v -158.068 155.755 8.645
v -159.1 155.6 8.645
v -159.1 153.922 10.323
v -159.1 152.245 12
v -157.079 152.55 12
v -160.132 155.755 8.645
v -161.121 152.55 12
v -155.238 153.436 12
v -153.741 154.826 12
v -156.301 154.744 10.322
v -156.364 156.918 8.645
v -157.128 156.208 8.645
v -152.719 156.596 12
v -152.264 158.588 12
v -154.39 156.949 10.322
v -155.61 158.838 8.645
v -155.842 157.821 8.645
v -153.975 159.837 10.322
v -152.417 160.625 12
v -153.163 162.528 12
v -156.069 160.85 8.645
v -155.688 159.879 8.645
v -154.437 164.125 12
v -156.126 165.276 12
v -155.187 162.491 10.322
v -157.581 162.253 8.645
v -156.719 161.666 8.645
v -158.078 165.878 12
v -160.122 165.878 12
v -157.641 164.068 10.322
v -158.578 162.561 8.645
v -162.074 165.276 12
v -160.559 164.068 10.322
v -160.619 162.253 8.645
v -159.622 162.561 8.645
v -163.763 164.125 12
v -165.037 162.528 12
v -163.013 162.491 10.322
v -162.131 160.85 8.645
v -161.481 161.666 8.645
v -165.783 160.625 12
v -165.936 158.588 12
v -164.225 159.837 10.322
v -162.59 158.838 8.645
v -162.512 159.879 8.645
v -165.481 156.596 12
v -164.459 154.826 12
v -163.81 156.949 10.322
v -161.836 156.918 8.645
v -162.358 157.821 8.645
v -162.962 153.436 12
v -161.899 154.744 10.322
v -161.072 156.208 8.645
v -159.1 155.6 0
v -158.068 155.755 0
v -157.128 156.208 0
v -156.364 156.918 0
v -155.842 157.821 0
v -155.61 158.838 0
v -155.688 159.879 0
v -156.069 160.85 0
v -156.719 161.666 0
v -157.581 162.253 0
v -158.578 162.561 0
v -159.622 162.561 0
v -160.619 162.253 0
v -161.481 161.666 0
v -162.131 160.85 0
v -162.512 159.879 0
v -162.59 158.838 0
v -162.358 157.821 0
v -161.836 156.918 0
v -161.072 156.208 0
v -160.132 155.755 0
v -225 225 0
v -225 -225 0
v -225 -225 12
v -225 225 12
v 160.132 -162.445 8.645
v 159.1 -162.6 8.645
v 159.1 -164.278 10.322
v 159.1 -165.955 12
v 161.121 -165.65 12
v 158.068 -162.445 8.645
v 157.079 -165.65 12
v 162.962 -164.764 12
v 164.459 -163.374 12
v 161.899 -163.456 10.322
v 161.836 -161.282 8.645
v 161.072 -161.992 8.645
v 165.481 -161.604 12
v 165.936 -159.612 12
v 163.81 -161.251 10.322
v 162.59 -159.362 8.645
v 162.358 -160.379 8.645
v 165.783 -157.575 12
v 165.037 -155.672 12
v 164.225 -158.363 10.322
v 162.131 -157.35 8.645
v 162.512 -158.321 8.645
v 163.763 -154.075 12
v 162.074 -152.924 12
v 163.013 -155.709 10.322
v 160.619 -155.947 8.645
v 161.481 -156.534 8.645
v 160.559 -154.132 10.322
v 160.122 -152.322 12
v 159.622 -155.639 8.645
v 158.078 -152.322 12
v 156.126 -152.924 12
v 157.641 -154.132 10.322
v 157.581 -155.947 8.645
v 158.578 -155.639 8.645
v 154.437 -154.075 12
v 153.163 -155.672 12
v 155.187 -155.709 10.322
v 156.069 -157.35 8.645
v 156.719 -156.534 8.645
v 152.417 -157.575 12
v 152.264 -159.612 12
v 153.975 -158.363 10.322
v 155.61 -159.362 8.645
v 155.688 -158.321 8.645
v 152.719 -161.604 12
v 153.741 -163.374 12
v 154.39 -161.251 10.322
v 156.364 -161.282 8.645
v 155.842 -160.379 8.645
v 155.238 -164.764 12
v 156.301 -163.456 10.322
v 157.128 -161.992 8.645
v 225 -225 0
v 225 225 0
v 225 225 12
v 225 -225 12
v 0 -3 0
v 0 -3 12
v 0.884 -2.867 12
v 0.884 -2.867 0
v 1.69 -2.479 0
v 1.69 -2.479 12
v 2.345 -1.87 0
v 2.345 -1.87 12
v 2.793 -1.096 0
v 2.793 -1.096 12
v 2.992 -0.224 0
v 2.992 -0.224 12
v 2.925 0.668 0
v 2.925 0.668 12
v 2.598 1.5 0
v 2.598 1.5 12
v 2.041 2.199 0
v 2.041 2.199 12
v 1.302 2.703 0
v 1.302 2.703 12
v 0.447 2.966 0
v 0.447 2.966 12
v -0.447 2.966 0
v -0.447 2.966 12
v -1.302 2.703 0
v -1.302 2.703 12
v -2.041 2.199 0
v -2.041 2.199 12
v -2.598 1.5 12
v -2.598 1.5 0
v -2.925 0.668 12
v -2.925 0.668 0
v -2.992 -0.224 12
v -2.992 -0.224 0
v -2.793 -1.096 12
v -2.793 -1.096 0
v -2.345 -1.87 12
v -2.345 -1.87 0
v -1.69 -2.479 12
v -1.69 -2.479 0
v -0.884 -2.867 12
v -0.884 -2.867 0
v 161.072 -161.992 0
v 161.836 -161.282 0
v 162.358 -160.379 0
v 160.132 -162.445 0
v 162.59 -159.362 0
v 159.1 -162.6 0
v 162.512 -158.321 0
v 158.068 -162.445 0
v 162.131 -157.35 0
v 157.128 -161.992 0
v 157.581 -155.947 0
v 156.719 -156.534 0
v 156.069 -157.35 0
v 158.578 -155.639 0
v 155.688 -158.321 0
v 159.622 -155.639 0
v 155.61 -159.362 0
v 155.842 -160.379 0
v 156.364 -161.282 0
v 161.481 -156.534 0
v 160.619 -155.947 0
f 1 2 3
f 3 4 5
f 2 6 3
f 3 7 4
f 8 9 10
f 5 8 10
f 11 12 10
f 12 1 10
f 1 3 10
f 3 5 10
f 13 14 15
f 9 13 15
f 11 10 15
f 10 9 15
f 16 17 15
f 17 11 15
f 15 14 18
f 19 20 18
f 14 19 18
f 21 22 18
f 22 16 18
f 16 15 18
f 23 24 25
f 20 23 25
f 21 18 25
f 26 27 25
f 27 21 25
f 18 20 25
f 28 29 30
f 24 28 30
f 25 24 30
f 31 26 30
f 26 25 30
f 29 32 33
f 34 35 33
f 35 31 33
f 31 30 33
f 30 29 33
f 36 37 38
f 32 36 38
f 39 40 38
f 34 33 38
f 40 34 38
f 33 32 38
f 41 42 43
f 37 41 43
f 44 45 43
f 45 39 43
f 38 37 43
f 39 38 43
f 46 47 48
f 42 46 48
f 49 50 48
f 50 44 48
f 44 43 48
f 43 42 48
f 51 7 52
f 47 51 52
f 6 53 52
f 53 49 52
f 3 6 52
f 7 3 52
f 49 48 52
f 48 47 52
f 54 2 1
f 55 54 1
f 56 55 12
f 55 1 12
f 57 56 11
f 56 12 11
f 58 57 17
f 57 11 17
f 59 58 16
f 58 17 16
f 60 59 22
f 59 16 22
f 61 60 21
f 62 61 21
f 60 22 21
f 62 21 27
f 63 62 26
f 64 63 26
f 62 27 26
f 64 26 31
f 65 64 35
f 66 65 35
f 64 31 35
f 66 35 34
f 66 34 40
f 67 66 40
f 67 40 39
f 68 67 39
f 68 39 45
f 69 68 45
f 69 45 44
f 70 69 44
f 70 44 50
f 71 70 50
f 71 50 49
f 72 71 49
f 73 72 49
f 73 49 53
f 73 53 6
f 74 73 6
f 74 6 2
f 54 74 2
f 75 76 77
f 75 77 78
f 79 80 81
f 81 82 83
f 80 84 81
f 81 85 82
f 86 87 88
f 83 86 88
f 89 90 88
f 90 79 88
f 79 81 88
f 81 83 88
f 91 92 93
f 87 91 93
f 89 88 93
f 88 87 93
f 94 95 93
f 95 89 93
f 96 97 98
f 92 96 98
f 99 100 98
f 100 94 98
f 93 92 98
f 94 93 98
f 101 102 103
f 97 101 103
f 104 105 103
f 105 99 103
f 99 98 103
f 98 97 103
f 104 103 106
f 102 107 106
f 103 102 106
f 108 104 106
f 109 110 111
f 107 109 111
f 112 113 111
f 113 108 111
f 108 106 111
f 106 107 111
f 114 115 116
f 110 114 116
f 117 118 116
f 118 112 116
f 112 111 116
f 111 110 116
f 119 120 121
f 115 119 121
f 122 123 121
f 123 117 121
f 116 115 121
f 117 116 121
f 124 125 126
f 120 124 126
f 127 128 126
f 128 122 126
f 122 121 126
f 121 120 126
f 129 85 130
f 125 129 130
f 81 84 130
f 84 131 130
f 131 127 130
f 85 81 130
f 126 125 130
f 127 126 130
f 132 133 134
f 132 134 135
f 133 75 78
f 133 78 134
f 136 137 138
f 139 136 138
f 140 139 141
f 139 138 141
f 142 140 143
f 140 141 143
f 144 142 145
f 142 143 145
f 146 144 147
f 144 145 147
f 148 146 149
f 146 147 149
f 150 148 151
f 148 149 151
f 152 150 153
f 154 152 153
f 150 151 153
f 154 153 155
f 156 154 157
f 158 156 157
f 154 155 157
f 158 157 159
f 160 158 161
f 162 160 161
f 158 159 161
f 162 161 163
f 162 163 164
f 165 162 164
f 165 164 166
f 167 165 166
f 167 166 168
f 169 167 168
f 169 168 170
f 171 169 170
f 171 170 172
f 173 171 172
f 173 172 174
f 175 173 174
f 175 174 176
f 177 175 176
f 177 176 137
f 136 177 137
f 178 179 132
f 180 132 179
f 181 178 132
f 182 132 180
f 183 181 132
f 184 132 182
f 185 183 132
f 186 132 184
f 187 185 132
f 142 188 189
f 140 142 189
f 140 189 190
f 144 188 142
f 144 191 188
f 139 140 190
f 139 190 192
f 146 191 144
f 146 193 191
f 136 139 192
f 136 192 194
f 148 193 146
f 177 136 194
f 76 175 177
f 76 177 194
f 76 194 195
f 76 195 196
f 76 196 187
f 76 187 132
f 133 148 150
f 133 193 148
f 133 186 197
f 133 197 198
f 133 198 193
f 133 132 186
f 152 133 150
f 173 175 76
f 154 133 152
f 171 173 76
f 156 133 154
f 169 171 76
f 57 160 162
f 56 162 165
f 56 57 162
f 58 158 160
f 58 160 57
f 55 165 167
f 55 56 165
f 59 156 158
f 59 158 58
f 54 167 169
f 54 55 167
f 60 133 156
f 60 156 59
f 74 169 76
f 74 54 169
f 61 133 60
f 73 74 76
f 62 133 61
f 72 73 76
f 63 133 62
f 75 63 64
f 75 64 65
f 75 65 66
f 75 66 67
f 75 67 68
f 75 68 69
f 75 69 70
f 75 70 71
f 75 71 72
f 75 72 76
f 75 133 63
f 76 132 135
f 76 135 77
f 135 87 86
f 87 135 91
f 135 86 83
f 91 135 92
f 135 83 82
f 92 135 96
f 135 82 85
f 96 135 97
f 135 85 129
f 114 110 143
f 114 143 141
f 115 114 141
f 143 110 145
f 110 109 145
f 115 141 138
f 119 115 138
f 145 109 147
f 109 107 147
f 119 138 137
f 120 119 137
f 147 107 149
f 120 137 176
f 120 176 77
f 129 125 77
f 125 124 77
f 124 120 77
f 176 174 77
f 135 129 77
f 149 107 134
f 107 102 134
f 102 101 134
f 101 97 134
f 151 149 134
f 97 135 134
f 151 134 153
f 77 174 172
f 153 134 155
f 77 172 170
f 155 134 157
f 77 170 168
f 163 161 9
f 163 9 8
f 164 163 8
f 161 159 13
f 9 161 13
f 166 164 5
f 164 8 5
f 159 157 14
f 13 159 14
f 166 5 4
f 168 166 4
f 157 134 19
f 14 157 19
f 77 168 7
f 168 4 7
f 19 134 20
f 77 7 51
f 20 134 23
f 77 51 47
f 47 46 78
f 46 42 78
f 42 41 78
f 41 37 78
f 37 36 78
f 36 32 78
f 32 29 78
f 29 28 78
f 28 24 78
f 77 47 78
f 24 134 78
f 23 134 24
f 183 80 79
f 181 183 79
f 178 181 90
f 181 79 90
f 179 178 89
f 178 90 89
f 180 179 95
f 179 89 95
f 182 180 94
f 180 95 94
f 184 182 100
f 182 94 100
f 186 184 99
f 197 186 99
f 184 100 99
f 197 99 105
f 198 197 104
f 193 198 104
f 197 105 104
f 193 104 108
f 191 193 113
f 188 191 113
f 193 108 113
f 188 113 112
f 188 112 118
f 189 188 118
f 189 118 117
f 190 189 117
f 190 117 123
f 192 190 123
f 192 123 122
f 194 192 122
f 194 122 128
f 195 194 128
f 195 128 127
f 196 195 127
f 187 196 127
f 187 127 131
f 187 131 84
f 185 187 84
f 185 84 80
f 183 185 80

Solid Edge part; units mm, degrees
sketch "Sketch1" plane through (0, 0, 0) normal (0, 0, 1) x (1, 0, 0)
  line L0 (225, 225) -> (225, -225)
  line L1 (225, -225) -> (-225, -225)
  line L2 (-225, -225) -> (-225, 225)
  line L3 (-225, 225) -> (225, 225)
extrude "Protrusion1" add sketch "Sketch1" along normal blind 12
hole "Hole_1" at (-159.1, 159.1, 12) direction (0, 0, -1) diameter 7 end up to next countersink diameter 13.71 countersink angle 90
hole "Hole1" at (159.1, -159.1, 12) direction (0, 0, -1) diameter 7 end up to next countersink diameter 13.71 countersink angle 90
hole "Hole_3" at (0, 0, 12) direction (0, 0, -1) diameter 6 end up to next
